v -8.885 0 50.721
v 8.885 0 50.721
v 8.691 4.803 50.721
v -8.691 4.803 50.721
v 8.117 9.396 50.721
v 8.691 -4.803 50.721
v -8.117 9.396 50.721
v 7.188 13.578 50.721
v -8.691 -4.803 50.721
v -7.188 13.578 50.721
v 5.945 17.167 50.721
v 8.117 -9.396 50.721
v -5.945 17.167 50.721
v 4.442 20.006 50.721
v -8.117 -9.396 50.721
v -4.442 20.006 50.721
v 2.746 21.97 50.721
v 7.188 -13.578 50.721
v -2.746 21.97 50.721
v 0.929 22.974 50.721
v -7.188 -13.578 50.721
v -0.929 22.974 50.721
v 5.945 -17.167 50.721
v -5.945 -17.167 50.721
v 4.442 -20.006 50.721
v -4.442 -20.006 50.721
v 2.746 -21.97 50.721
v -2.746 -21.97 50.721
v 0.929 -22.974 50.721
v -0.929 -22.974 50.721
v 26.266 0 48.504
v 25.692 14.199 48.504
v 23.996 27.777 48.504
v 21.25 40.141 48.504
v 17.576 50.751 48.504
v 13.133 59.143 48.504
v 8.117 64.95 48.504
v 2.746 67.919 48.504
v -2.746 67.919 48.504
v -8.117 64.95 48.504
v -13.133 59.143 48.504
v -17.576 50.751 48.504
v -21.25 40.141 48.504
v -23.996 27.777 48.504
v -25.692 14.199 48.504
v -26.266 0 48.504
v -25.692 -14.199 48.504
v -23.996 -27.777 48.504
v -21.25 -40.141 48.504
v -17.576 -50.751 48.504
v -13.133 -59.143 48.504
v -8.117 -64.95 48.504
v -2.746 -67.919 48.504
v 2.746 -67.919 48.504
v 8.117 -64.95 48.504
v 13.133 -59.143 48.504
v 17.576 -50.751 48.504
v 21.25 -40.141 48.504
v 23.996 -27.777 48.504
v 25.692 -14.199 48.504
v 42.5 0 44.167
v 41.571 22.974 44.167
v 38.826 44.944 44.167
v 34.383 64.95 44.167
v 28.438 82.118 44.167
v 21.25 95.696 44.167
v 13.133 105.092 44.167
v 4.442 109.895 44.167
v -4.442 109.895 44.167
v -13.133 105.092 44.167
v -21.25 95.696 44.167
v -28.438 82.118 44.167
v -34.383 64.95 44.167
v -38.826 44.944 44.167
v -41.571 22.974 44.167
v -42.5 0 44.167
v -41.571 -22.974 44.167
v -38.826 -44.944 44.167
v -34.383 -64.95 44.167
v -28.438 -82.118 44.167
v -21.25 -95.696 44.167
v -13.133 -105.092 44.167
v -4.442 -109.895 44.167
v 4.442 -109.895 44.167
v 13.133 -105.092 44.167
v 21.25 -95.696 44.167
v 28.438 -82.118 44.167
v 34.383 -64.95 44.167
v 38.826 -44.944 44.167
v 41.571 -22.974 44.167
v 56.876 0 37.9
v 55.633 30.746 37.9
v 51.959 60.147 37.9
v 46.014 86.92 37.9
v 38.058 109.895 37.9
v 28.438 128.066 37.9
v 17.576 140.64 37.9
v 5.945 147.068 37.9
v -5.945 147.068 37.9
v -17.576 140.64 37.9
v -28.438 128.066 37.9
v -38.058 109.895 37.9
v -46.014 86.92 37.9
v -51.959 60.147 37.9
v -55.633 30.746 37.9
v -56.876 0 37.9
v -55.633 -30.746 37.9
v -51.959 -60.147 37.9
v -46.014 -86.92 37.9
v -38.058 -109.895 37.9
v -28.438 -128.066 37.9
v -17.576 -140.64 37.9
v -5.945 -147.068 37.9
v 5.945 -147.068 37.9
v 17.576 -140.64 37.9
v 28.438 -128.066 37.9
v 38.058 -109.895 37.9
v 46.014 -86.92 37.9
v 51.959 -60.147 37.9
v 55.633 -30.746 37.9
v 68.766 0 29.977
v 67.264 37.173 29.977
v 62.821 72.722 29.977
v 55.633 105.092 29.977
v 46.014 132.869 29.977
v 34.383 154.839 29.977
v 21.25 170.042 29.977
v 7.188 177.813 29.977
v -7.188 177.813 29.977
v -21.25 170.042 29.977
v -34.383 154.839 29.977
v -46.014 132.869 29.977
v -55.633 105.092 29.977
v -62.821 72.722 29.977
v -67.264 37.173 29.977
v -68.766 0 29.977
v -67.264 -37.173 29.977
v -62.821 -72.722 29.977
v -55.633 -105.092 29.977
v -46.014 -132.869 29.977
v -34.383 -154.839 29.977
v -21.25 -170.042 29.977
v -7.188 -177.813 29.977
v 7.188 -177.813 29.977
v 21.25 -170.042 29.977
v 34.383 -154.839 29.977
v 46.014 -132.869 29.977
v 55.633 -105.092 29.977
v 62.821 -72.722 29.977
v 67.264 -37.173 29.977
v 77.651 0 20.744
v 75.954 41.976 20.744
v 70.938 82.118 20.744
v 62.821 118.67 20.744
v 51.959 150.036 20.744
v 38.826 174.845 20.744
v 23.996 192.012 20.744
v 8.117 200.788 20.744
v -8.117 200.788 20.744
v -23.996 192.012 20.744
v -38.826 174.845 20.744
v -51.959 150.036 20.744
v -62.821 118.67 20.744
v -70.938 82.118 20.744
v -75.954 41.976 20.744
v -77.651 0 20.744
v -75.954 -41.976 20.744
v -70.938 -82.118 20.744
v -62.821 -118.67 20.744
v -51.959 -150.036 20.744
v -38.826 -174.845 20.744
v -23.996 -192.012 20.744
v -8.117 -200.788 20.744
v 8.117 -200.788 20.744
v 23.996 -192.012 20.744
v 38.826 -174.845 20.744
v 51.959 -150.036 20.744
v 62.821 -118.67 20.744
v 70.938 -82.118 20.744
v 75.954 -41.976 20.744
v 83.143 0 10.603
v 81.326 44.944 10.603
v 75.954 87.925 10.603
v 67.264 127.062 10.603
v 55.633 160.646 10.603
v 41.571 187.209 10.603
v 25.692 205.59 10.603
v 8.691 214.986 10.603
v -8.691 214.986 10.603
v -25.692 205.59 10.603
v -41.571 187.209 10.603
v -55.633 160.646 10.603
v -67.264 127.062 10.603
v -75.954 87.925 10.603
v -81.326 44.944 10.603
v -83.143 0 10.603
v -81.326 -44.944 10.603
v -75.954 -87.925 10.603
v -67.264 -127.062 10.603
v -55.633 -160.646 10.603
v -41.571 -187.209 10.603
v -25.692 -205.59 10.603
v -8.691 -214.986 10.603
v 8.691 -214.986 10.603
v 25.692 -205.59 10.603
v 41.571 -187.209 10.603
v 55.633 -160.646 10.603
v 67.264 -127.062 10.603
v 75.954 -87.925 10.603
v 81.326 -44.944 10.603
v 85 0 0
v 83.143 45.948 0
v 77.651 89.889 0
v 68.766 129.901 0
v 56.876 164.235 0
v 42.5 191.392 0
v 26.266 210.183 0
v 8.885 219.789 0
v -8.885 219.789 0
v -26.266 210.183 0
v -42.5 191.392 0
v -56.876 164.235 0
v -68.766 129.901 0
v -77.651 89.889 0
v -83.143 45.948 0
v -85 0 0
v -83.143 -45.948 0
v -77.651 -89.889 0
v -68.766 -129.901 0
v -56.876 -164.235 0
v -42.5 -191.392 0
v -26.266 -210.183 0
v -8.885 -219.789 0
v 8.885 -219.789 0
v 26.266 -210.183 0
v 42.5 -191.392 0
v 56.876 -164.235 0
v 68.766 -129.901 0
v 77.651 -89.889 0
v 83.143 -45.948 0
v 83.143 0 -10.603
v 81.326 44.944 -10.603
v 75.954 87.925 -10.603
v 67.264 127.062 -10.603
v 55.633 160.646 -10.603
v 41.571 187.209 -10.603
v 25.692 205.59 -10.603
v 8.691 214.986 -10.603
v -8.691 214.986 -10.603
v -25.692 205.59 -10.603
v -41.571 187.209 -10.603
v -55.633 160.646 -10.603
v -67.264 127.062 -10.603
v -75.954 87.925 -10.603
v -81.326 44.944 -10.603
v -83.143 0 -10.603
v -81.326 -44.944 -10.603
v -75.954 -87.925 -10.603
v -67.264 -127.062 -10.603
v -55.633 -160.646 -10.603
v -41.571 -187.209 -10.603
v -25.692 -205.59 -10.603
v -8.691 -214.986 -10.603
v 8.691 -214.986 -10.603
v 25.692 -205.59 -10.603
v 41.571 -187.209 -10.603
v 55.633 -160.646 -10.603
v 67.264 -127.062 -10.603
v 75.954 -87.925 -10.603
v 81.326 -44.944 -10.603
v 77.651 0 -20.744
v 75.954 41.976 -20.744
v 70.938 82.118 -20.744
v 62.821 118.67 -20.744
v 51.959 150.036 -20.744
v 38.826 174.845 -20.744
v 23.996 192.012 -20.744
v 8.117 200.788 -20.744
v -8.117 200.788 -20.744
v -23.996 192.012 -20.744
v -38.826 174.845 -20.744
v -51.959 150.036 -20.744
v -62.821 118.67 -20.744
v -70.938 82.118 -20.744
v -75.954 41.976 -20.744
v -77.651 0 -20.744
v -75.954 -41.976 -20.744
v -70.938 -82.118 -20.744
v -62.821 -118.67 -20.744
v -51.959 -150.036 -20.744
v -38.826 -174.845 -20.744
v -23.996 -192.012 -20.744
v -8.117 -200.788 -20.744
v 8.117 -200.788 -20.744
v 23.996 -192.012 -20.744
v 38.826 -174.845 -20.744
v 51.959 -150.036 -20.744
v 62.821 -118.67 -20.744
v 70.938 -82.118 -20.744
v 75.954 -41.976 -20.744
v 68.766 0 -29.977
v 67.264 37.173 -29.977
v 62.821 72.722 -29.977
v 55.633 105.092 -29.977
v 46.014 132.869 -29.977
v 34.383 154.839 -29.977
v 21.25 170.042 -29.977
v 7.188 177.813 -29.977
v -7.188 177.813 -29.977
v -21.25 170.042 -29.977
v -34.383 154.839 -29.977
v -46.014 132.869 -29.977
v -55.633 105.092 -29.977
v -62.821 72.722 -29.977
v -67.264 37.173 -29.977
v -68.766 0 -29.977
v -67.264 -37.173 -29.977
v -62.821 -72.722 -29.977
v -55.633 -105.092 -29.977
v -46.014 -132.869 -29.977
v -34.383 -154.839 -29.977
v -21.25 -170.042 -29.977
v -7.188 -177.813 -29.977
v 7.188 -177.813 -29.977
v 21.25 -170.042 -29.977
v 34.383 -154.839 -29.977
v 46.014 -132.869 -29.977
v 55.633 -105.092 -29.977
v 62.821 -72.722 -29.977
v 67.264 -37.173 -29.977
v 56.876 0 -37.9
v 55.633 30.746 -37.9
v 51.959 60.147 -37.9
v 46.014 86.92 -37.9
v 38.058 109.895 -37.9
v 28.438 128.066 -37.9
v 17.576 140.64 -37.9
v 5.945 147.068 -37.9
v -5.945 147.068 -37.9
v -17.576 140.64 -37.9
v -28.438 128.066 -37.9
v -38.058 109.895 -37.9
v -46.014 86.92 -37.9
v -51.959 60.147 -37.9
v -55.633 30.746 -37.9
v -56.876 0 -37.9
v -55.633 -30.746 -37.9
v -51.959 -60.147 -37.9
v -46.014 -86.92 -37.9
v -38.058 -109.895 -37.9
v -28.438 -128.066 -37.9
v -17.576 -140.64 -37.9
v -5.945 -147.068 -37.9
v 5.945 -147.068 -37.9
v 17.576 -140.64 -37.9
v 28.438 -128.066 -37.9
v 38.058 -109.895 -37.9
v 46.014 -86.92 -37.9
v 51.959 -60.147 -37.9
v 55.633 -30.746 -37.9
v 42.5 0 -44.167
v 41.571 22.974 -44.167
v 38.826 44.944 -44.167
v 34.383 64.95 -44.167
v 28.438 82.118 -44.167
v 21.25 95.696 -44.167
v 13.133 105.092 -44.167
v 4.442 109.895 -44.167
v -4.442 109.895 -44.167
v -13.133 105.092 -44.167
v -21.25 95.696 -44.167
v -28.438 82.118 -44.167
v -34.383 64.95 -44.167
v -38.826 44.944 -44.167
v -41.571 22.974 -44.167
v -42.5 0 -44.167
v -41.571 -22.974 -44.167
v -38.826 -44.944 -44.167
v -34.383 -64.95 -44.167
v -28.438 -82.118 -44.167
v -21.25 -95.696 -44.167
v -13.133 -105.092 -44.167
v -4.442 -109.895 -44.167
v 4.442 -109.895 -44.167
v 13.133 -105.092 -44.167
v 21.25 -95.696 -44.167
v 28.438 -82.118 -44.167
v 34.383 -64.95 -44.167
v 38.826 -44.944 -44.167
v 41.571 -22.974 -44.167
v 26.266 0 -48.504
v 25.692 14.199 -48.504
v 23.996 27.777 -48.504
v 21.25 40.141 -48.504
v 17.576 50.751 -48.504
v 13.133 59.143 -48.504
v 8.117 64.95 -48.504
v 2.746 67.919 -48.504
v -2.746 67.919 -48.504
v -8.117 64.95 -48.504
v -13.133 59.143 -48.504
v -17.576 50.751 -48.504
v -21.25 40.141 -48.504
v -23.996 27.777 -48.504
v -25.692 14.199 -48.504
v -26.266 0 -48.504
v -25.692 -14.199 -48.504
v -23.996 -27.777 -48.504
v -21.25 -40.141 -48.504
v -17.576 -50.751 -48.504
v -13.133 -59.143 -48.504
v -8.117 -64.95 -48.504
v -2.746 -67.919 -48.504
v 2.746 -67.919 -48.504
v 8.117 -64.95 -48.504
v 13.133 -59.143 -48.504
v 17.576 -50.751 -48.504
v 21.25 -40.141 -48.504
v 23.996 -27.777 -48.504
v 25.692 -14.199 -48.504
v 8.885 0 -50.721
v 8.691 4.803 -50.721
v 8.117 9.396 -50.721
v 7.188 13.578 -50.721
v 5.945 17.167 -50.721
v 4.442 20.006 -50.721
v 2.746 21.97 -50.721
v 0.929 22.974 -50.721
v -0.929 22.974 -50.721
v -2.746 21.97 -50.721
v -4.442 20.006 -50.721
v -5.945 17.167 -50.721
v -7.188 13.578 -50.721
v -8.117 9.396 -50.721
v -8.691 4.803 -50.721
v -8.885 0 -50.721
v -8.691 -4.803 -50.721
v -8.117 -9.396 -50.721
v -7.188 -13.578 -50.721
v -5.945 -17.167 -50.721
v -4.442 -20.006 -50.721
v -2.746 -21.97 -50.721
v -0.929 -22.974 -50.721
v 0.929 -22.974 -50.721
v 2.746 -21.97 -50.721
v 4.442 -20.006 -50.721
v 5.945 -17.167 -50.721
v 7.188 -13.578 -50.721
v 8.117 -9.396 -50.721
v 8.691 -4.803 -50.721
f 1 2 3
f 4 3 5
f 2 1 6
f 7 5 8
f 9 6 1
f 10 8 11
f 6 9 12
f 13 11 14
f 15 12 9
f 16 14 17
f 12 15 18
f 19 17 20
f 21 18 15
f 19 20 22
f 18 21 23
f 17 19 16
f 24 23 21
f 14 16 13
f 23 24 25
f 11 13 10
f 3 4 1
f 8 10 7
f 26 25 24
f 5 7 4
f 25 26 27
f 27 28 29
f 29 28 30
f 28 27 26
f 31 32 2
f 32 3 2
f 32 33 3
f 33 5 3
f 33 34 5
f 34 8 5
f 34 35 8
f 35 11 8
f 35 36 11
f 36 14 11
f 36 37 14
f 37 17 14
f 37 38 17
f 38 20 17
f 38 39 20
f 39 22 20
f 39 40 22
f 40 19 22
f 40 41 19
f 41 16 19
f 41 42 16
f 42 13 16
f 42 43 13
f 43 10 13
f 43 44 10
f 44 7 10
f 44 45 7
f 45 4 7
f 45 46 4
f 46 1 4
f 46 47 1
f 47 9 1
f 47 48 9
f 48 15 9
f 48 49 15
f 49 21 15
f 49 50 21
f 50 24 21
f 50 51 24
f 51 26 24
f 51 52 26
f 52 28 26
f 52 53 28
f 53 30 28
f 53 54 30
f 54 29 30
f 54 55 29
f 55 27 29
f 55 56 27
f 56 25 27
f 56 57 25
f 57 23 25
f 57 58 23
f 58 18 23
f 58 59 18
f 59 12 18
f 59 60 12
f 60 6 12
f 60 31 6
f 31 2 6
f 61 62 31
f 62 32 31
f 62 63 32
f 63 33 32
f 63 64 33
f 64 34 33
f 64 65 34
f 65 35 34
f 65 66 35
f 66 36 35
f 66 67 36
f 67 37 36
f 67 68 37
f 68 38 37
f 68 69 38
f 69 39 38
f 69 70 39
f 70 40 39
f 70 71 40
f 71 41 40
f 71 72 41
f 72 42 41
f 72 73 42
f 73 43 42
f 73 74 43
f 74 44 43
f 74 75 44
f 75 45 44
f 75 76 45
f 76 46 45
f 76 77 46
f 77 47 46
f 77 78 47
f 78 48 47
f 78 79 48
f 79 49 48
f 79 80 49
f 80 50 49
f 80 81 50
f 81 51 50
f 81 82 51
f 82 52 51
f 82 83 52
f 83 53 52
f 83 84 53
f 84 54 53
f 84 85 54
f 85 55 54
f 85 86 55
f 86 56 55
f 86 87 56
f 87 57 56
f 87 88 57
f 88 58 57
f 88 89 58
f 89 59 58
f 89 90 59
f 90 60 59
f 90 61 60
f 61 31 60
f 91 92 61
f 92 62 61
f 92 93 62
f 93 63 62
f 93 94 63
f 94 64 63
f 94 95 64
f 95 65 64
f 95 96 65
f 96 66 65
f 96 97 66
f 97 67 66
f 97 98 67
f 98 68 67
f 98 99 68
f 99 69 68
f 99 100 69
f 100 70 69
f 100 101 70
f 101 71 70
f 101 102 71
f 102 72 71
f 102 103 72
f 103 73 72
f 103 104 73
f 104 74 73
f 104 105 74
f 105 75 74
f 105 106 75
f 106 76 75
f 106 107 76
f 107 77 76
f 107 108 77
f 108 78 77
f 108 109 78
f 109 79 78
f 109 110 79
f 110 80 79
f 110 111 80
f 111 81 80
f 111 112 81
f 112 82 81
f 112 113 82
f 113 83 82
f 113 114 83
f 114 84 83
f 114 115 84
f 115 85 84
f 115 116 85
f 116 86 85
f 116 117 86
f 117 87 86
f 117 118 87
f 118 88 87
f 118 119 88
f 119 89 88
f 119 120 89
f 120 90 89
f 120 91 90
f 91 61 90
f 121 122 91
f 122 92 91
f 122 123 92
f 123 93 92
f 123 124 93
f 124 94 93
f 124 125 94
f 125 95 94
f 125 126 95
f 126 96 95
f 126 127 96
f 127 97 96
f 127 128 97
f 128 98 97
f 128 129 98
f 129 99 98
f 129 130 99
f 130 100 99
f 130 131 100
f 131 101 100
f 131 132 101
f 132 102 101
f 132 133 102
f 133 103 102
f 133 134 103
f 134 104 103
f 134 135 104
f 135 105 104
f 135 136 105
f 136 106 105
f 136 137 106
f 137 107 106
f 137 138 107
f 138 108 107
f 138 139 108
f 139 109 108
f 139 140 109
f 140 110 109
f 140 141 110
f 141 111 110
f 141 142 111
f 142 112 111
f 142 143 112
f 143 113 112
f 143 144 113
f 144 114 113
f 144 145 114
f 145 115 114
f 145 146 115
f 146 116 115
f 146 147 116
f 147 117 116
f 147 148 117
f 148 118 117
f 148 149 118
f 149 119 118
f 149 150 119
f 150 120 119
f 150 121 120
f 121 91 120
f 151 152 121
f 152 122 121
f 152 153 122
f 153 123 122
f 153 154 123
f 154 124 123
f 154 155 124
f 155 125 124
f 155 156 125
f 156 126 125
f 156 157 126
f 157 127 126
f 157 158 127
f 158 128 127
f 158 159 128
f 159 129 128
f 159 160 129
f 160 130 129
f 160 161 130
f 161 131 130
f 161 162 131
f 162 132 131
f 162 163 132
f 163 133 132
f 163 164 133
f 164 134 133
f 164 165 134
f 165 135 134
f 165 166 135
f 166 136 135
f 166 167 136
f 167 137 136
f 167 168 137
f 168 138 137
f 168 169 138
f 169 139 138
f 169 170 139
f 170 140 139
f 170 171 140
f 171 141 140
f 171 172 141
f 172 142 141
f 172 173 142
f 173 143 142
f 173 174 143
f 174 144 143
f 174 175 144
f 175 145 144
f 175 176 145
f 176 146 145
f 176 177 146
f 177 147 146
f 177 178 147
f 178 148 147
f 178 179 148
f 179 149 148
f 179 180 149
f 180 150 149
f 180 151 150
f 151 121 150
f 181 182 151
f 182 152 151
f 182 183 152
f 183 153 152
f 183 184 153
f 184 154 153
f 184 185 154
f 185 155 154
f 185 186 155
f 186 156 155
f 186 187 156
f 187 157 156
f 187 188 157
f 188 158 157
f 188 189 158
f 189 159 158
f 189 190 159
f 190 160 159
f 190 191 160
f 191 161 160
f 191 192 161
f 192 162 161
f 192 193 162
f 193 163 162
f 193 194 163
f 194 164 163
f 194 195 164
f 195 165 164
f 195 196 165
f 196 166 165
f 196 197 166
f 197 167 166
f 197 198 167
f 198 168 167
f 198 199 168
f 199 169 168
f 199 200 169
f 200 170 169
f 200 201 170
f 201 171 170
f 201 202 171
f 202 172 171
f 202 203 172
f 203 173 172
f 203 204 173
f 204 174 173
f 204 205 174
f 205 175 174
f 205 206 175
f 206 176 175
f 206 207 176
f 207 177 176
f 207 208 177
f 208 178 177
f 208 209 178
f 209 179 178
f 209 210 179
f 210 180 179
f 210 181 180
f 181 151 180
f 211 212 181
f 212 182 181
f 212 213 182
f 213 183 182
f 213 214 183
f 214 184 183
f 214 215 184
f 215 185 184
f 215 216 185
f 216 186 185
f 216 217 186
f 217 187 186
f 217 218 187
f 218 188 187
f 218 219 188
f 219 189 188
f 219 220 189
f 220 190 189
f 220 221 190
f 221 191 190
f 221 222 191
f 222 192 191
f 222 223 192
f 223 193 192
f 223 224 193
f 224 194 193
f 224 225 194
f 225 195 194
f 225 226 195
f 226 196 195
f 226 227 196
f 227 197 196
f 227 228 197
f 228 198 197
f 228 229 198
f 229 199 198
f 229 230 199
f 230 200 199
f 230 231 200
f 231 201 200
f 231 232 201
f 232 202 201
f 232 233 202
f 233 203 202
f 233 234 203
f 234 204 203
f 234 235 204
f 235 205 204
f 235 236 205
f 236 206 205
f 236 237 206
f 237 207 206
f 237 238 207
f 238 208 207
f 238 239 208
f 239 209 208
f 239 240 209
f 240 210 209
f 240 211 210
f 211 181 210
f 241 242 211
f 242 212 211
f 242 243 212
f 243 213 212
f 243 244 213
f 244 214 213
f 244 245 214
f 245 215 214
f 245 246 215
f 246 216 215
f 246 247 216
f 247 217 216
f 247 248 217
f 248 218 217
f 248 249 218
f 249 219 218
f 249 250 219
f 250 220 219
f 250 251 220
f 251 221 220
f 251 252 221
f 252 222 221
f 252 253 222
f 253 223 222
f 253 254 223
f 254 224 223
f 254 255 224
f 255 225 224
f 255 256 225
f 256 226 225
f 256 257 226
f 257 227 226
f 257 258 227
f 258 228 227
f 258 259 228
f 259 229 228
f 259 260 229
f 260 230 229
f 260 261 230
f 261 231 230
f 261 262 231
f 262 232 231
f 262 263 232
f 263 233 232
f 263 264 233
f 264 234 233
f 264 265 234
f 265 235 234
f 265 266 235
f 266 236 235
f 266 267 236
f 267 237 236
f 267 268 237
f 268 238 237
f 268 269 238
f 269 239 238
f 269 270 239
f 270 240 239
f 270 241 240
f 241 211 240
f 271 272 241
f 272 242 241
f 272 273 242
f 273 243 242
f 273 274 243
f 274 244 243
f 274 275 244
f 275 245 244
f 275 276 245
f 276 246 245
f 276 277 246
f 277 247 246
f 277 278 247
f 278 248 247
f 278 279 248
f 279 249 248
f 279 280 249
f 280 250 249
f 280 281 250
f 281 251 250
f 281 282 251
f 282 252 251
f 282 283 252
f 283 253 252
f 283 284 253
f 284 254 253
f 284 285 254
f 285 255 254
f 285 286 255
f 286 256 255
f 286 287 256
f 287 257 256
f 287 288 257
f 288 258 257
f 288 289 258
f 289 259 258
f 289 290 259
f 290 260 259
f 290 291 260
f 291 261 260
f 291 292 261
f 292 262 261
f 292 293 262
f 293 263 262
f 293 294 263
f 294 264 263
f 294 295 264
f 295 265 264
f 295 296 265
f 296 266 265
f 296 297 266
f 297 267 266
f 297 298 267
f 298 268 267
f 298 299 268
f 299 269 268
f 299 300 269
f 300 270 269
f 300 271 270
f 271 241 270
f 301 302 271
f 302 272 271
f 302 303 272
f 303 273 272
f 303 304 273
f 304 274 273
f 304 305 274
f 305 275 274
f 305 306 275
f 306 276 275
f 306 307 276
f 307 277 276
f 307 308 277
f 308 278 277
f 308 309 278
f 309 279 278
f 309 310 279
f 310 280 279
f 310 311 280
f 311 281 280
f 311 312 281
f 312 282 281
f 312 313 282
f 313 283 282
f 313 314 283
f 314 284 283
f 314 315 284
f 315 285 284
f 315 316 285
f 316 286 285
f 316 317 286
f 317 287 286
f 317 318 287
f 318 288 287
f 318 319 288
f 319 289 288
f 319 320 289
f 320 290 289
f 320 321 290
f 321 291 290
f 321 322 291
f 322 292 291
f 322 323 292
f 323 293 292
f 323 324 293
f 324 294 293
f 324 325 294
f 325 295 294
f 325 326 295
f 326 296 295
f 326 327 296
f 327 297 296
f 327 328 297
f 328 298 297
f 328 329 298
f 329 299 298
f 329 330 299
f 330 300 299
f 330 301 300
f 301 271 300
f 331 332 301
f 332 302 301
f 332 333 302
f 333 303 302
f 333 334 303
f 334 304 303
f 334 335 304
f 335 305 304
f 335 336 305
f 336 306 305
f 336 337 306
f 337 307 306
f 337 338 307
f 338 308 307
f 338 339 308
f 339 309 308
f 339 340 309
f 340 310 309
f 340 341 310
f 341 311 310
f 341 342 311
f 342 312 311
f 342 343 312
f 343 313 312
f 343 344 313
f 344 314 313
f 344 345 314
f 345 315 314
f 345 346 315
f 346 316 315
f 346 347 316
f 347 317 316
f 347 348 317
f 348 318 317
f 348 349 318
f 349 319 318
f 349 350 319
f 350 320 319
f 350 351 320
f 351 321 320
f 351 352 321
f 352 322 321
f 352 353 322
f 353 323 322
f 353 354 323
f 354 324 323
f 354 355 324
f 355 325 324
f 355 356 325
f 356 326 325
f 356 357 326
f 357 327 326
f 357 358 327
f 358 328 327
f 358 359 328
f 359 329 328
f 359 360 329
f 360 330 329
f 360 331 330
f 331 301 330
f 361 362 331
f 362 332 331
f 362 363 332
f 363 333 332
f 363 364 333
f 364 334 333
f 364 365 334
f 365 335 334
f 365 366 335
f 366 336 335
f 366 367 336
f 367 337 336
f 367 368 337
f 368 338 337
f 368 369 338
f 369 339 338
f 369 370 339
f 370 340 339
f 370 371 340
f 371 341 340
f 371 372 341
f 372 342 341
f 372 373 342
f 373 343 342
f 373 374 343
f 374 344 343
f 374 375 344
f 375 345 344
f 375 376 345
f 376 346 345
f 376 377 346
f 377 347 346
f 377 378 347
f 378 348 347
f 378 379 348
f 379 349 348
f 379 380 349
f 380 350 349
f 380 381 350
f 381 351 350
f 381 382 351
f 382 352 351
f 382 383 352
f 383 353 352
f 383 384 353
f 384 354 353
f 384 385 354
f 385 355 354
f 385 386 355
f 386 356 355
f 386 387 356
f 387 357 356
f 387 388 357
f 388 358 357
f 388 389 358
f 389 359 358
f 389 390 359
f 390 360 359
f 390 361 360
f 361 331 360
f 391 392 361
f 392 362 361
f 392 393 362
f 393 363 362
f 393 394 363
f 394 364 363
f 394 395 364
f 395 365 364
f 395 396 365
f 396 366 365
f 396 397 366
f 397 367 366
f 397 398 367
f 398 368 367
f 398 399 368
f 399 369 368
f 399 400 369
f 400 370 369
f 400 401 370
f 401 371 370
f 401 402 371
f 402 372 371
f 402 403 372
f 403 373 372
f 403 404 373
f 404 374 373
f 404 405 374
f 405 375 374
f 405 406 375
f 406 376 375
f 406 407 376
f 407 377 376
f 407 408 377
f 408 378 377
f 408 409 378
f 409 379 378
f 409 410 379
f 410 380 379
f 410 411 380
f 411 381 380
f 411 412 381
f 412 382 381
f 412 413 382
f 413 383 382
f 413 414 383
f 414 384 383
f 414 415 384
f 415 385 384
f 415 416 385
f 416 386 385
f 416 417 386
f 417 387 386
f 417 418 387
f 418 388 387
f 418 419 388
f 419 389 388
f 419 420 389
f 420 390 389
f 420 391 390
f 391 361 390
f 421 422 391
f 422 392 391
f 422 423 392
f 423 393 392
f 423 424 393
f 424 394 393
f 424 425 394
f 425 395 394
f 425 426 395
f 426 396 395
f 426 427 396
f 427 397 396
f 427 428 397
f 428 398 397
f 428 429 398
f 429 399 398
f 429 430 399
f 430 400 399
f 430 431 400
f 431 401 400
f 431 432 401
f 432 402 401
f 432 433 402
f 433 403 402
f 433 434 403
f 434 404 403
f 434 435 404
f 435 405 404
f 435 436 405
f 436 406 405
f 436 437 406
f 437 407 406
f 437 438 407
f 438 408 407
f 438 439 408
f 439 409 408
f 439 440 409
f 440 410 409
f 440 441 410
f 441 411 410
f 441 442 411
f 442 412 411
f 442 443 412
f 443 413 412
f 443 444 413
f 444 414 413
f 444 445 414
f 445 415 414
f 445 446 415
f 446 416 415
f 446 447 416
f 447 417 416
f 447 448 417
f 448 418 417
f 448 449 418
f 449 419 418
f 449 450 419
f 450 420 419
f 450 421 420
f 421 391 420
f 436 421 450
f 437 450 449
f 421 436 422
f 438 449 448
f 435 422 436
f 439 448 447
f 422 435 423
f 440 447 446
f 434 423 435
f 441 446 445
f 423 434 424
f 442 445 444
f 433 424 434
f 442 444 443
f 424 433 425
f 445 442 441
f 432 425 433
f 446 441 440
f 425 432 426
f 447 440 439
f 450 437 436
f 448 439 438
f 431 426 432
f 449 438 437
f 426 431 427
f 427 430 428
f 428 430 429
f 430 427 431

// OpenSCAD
// Generated by SolidPython 1.0.1 on 2020-07-29 00:46:46


scale(v = [5, 13, 3]) {
	sphere(r = 17);
}
/***********************************************
*********      SolidPython code:      **********
************************************************
 
# import packages: SolidPython
from solid import *
from solid.utils import *
from itertools import chain, combinations, permutations


class Resize:

    def __init__(self, scad_file):
        self.scad_file = scad_file
        #self.scad_file = import_scad(scad_file)
        # cone/cylinder param:
        self.r1 = 0
        self.r2 = 0
        self.h = 0
        # rectangular prism param:
        self.w = 0
        self.l = 0
        # ellipse param:
        self.r = 0

    # import OpenScad code (file name corresponds to shape)


    # classify shape + parameters
    def assign(self, param1, param2, param3):
        if self.scad_file == 'cone.scad':
            self.r1 = param1
            self.r2 = param2
            self.h = param3
        elif self.scad_file == 'cylinder.scad':
            self.r1 = param1
            self.r2 = param2
            self.h = param3
        elif self.scad_file == 'rectangularPrism.scad':
            self.h = param1
            self.l = param2
            self.w = param3
        else:
            self.r = param1
            self.h = param2

    # resize parameters
    def iterate(self):
        x = range(3, 20, 2)
        i = 1
        if self.scad_file == 'cone.scad':
            tempList = list(permutations(x, 2))
            for temp in tempList:
                param1 = temp[0]
                param2 = temp[1]
                filepath = 'produced_scad_files/' + 'cone' + str(param1) + '_' + str(param2) + '_' + '.scad'
                scad_render_to_file(cylinder(h=param1, r1=param2, r2=0), filepath)

        elif self.scad_file == 'cylinder.scad':
            tempList = list(permutations(x, 3))
            for temp in tempList:
                param1 = temp[0]
                param2 = temp[1]
                filepath = 'produced_scad_files/' + 'cylinder' + str(param1) + '_' + str(param2) + '_' + '.scad'
                scad_render_to_file(cylinder(h=param1, r1=param2, r2=param2), filepath)

        elif self.scad_file == 'rectangularPrism.scad':
            tempList = list(permutations(x, 3))
            for temp in tempList:
                param1 = temp[0]
                param2 = temp[1]
                param3 = temp[2]
                filepath = 'produced_scad_files/' + 'rectangularPrism' + str(param1) + '_' + str(param2) + '_' + str(
                    param3) + '.scad'
                scad_render_to_file(cube(size=(param1, param2, param3)), filepath)

        elif self.scad_file == 'ellipse.scad':
            tempList = list(permutations(x, 4))
            for temp in tempList:
                param1 = temp[0]
                param2 = temp[1]
                param3 = temp[2]
                param4 = temp[3]
                filepath = 'produced_scad_files/' + 'ellipse' + str(param1) + '_' + str(param2) + '_' + str(param3) + '_' + str(param4) + '.scad'
                scad_render_to_file(scale([param1, param2, param3])(sphere(r=param4)), filepath)

    def render_to_scadfile(self):
        scad_render_to_file(scad, 'example.scad') 
 
************************************************/
